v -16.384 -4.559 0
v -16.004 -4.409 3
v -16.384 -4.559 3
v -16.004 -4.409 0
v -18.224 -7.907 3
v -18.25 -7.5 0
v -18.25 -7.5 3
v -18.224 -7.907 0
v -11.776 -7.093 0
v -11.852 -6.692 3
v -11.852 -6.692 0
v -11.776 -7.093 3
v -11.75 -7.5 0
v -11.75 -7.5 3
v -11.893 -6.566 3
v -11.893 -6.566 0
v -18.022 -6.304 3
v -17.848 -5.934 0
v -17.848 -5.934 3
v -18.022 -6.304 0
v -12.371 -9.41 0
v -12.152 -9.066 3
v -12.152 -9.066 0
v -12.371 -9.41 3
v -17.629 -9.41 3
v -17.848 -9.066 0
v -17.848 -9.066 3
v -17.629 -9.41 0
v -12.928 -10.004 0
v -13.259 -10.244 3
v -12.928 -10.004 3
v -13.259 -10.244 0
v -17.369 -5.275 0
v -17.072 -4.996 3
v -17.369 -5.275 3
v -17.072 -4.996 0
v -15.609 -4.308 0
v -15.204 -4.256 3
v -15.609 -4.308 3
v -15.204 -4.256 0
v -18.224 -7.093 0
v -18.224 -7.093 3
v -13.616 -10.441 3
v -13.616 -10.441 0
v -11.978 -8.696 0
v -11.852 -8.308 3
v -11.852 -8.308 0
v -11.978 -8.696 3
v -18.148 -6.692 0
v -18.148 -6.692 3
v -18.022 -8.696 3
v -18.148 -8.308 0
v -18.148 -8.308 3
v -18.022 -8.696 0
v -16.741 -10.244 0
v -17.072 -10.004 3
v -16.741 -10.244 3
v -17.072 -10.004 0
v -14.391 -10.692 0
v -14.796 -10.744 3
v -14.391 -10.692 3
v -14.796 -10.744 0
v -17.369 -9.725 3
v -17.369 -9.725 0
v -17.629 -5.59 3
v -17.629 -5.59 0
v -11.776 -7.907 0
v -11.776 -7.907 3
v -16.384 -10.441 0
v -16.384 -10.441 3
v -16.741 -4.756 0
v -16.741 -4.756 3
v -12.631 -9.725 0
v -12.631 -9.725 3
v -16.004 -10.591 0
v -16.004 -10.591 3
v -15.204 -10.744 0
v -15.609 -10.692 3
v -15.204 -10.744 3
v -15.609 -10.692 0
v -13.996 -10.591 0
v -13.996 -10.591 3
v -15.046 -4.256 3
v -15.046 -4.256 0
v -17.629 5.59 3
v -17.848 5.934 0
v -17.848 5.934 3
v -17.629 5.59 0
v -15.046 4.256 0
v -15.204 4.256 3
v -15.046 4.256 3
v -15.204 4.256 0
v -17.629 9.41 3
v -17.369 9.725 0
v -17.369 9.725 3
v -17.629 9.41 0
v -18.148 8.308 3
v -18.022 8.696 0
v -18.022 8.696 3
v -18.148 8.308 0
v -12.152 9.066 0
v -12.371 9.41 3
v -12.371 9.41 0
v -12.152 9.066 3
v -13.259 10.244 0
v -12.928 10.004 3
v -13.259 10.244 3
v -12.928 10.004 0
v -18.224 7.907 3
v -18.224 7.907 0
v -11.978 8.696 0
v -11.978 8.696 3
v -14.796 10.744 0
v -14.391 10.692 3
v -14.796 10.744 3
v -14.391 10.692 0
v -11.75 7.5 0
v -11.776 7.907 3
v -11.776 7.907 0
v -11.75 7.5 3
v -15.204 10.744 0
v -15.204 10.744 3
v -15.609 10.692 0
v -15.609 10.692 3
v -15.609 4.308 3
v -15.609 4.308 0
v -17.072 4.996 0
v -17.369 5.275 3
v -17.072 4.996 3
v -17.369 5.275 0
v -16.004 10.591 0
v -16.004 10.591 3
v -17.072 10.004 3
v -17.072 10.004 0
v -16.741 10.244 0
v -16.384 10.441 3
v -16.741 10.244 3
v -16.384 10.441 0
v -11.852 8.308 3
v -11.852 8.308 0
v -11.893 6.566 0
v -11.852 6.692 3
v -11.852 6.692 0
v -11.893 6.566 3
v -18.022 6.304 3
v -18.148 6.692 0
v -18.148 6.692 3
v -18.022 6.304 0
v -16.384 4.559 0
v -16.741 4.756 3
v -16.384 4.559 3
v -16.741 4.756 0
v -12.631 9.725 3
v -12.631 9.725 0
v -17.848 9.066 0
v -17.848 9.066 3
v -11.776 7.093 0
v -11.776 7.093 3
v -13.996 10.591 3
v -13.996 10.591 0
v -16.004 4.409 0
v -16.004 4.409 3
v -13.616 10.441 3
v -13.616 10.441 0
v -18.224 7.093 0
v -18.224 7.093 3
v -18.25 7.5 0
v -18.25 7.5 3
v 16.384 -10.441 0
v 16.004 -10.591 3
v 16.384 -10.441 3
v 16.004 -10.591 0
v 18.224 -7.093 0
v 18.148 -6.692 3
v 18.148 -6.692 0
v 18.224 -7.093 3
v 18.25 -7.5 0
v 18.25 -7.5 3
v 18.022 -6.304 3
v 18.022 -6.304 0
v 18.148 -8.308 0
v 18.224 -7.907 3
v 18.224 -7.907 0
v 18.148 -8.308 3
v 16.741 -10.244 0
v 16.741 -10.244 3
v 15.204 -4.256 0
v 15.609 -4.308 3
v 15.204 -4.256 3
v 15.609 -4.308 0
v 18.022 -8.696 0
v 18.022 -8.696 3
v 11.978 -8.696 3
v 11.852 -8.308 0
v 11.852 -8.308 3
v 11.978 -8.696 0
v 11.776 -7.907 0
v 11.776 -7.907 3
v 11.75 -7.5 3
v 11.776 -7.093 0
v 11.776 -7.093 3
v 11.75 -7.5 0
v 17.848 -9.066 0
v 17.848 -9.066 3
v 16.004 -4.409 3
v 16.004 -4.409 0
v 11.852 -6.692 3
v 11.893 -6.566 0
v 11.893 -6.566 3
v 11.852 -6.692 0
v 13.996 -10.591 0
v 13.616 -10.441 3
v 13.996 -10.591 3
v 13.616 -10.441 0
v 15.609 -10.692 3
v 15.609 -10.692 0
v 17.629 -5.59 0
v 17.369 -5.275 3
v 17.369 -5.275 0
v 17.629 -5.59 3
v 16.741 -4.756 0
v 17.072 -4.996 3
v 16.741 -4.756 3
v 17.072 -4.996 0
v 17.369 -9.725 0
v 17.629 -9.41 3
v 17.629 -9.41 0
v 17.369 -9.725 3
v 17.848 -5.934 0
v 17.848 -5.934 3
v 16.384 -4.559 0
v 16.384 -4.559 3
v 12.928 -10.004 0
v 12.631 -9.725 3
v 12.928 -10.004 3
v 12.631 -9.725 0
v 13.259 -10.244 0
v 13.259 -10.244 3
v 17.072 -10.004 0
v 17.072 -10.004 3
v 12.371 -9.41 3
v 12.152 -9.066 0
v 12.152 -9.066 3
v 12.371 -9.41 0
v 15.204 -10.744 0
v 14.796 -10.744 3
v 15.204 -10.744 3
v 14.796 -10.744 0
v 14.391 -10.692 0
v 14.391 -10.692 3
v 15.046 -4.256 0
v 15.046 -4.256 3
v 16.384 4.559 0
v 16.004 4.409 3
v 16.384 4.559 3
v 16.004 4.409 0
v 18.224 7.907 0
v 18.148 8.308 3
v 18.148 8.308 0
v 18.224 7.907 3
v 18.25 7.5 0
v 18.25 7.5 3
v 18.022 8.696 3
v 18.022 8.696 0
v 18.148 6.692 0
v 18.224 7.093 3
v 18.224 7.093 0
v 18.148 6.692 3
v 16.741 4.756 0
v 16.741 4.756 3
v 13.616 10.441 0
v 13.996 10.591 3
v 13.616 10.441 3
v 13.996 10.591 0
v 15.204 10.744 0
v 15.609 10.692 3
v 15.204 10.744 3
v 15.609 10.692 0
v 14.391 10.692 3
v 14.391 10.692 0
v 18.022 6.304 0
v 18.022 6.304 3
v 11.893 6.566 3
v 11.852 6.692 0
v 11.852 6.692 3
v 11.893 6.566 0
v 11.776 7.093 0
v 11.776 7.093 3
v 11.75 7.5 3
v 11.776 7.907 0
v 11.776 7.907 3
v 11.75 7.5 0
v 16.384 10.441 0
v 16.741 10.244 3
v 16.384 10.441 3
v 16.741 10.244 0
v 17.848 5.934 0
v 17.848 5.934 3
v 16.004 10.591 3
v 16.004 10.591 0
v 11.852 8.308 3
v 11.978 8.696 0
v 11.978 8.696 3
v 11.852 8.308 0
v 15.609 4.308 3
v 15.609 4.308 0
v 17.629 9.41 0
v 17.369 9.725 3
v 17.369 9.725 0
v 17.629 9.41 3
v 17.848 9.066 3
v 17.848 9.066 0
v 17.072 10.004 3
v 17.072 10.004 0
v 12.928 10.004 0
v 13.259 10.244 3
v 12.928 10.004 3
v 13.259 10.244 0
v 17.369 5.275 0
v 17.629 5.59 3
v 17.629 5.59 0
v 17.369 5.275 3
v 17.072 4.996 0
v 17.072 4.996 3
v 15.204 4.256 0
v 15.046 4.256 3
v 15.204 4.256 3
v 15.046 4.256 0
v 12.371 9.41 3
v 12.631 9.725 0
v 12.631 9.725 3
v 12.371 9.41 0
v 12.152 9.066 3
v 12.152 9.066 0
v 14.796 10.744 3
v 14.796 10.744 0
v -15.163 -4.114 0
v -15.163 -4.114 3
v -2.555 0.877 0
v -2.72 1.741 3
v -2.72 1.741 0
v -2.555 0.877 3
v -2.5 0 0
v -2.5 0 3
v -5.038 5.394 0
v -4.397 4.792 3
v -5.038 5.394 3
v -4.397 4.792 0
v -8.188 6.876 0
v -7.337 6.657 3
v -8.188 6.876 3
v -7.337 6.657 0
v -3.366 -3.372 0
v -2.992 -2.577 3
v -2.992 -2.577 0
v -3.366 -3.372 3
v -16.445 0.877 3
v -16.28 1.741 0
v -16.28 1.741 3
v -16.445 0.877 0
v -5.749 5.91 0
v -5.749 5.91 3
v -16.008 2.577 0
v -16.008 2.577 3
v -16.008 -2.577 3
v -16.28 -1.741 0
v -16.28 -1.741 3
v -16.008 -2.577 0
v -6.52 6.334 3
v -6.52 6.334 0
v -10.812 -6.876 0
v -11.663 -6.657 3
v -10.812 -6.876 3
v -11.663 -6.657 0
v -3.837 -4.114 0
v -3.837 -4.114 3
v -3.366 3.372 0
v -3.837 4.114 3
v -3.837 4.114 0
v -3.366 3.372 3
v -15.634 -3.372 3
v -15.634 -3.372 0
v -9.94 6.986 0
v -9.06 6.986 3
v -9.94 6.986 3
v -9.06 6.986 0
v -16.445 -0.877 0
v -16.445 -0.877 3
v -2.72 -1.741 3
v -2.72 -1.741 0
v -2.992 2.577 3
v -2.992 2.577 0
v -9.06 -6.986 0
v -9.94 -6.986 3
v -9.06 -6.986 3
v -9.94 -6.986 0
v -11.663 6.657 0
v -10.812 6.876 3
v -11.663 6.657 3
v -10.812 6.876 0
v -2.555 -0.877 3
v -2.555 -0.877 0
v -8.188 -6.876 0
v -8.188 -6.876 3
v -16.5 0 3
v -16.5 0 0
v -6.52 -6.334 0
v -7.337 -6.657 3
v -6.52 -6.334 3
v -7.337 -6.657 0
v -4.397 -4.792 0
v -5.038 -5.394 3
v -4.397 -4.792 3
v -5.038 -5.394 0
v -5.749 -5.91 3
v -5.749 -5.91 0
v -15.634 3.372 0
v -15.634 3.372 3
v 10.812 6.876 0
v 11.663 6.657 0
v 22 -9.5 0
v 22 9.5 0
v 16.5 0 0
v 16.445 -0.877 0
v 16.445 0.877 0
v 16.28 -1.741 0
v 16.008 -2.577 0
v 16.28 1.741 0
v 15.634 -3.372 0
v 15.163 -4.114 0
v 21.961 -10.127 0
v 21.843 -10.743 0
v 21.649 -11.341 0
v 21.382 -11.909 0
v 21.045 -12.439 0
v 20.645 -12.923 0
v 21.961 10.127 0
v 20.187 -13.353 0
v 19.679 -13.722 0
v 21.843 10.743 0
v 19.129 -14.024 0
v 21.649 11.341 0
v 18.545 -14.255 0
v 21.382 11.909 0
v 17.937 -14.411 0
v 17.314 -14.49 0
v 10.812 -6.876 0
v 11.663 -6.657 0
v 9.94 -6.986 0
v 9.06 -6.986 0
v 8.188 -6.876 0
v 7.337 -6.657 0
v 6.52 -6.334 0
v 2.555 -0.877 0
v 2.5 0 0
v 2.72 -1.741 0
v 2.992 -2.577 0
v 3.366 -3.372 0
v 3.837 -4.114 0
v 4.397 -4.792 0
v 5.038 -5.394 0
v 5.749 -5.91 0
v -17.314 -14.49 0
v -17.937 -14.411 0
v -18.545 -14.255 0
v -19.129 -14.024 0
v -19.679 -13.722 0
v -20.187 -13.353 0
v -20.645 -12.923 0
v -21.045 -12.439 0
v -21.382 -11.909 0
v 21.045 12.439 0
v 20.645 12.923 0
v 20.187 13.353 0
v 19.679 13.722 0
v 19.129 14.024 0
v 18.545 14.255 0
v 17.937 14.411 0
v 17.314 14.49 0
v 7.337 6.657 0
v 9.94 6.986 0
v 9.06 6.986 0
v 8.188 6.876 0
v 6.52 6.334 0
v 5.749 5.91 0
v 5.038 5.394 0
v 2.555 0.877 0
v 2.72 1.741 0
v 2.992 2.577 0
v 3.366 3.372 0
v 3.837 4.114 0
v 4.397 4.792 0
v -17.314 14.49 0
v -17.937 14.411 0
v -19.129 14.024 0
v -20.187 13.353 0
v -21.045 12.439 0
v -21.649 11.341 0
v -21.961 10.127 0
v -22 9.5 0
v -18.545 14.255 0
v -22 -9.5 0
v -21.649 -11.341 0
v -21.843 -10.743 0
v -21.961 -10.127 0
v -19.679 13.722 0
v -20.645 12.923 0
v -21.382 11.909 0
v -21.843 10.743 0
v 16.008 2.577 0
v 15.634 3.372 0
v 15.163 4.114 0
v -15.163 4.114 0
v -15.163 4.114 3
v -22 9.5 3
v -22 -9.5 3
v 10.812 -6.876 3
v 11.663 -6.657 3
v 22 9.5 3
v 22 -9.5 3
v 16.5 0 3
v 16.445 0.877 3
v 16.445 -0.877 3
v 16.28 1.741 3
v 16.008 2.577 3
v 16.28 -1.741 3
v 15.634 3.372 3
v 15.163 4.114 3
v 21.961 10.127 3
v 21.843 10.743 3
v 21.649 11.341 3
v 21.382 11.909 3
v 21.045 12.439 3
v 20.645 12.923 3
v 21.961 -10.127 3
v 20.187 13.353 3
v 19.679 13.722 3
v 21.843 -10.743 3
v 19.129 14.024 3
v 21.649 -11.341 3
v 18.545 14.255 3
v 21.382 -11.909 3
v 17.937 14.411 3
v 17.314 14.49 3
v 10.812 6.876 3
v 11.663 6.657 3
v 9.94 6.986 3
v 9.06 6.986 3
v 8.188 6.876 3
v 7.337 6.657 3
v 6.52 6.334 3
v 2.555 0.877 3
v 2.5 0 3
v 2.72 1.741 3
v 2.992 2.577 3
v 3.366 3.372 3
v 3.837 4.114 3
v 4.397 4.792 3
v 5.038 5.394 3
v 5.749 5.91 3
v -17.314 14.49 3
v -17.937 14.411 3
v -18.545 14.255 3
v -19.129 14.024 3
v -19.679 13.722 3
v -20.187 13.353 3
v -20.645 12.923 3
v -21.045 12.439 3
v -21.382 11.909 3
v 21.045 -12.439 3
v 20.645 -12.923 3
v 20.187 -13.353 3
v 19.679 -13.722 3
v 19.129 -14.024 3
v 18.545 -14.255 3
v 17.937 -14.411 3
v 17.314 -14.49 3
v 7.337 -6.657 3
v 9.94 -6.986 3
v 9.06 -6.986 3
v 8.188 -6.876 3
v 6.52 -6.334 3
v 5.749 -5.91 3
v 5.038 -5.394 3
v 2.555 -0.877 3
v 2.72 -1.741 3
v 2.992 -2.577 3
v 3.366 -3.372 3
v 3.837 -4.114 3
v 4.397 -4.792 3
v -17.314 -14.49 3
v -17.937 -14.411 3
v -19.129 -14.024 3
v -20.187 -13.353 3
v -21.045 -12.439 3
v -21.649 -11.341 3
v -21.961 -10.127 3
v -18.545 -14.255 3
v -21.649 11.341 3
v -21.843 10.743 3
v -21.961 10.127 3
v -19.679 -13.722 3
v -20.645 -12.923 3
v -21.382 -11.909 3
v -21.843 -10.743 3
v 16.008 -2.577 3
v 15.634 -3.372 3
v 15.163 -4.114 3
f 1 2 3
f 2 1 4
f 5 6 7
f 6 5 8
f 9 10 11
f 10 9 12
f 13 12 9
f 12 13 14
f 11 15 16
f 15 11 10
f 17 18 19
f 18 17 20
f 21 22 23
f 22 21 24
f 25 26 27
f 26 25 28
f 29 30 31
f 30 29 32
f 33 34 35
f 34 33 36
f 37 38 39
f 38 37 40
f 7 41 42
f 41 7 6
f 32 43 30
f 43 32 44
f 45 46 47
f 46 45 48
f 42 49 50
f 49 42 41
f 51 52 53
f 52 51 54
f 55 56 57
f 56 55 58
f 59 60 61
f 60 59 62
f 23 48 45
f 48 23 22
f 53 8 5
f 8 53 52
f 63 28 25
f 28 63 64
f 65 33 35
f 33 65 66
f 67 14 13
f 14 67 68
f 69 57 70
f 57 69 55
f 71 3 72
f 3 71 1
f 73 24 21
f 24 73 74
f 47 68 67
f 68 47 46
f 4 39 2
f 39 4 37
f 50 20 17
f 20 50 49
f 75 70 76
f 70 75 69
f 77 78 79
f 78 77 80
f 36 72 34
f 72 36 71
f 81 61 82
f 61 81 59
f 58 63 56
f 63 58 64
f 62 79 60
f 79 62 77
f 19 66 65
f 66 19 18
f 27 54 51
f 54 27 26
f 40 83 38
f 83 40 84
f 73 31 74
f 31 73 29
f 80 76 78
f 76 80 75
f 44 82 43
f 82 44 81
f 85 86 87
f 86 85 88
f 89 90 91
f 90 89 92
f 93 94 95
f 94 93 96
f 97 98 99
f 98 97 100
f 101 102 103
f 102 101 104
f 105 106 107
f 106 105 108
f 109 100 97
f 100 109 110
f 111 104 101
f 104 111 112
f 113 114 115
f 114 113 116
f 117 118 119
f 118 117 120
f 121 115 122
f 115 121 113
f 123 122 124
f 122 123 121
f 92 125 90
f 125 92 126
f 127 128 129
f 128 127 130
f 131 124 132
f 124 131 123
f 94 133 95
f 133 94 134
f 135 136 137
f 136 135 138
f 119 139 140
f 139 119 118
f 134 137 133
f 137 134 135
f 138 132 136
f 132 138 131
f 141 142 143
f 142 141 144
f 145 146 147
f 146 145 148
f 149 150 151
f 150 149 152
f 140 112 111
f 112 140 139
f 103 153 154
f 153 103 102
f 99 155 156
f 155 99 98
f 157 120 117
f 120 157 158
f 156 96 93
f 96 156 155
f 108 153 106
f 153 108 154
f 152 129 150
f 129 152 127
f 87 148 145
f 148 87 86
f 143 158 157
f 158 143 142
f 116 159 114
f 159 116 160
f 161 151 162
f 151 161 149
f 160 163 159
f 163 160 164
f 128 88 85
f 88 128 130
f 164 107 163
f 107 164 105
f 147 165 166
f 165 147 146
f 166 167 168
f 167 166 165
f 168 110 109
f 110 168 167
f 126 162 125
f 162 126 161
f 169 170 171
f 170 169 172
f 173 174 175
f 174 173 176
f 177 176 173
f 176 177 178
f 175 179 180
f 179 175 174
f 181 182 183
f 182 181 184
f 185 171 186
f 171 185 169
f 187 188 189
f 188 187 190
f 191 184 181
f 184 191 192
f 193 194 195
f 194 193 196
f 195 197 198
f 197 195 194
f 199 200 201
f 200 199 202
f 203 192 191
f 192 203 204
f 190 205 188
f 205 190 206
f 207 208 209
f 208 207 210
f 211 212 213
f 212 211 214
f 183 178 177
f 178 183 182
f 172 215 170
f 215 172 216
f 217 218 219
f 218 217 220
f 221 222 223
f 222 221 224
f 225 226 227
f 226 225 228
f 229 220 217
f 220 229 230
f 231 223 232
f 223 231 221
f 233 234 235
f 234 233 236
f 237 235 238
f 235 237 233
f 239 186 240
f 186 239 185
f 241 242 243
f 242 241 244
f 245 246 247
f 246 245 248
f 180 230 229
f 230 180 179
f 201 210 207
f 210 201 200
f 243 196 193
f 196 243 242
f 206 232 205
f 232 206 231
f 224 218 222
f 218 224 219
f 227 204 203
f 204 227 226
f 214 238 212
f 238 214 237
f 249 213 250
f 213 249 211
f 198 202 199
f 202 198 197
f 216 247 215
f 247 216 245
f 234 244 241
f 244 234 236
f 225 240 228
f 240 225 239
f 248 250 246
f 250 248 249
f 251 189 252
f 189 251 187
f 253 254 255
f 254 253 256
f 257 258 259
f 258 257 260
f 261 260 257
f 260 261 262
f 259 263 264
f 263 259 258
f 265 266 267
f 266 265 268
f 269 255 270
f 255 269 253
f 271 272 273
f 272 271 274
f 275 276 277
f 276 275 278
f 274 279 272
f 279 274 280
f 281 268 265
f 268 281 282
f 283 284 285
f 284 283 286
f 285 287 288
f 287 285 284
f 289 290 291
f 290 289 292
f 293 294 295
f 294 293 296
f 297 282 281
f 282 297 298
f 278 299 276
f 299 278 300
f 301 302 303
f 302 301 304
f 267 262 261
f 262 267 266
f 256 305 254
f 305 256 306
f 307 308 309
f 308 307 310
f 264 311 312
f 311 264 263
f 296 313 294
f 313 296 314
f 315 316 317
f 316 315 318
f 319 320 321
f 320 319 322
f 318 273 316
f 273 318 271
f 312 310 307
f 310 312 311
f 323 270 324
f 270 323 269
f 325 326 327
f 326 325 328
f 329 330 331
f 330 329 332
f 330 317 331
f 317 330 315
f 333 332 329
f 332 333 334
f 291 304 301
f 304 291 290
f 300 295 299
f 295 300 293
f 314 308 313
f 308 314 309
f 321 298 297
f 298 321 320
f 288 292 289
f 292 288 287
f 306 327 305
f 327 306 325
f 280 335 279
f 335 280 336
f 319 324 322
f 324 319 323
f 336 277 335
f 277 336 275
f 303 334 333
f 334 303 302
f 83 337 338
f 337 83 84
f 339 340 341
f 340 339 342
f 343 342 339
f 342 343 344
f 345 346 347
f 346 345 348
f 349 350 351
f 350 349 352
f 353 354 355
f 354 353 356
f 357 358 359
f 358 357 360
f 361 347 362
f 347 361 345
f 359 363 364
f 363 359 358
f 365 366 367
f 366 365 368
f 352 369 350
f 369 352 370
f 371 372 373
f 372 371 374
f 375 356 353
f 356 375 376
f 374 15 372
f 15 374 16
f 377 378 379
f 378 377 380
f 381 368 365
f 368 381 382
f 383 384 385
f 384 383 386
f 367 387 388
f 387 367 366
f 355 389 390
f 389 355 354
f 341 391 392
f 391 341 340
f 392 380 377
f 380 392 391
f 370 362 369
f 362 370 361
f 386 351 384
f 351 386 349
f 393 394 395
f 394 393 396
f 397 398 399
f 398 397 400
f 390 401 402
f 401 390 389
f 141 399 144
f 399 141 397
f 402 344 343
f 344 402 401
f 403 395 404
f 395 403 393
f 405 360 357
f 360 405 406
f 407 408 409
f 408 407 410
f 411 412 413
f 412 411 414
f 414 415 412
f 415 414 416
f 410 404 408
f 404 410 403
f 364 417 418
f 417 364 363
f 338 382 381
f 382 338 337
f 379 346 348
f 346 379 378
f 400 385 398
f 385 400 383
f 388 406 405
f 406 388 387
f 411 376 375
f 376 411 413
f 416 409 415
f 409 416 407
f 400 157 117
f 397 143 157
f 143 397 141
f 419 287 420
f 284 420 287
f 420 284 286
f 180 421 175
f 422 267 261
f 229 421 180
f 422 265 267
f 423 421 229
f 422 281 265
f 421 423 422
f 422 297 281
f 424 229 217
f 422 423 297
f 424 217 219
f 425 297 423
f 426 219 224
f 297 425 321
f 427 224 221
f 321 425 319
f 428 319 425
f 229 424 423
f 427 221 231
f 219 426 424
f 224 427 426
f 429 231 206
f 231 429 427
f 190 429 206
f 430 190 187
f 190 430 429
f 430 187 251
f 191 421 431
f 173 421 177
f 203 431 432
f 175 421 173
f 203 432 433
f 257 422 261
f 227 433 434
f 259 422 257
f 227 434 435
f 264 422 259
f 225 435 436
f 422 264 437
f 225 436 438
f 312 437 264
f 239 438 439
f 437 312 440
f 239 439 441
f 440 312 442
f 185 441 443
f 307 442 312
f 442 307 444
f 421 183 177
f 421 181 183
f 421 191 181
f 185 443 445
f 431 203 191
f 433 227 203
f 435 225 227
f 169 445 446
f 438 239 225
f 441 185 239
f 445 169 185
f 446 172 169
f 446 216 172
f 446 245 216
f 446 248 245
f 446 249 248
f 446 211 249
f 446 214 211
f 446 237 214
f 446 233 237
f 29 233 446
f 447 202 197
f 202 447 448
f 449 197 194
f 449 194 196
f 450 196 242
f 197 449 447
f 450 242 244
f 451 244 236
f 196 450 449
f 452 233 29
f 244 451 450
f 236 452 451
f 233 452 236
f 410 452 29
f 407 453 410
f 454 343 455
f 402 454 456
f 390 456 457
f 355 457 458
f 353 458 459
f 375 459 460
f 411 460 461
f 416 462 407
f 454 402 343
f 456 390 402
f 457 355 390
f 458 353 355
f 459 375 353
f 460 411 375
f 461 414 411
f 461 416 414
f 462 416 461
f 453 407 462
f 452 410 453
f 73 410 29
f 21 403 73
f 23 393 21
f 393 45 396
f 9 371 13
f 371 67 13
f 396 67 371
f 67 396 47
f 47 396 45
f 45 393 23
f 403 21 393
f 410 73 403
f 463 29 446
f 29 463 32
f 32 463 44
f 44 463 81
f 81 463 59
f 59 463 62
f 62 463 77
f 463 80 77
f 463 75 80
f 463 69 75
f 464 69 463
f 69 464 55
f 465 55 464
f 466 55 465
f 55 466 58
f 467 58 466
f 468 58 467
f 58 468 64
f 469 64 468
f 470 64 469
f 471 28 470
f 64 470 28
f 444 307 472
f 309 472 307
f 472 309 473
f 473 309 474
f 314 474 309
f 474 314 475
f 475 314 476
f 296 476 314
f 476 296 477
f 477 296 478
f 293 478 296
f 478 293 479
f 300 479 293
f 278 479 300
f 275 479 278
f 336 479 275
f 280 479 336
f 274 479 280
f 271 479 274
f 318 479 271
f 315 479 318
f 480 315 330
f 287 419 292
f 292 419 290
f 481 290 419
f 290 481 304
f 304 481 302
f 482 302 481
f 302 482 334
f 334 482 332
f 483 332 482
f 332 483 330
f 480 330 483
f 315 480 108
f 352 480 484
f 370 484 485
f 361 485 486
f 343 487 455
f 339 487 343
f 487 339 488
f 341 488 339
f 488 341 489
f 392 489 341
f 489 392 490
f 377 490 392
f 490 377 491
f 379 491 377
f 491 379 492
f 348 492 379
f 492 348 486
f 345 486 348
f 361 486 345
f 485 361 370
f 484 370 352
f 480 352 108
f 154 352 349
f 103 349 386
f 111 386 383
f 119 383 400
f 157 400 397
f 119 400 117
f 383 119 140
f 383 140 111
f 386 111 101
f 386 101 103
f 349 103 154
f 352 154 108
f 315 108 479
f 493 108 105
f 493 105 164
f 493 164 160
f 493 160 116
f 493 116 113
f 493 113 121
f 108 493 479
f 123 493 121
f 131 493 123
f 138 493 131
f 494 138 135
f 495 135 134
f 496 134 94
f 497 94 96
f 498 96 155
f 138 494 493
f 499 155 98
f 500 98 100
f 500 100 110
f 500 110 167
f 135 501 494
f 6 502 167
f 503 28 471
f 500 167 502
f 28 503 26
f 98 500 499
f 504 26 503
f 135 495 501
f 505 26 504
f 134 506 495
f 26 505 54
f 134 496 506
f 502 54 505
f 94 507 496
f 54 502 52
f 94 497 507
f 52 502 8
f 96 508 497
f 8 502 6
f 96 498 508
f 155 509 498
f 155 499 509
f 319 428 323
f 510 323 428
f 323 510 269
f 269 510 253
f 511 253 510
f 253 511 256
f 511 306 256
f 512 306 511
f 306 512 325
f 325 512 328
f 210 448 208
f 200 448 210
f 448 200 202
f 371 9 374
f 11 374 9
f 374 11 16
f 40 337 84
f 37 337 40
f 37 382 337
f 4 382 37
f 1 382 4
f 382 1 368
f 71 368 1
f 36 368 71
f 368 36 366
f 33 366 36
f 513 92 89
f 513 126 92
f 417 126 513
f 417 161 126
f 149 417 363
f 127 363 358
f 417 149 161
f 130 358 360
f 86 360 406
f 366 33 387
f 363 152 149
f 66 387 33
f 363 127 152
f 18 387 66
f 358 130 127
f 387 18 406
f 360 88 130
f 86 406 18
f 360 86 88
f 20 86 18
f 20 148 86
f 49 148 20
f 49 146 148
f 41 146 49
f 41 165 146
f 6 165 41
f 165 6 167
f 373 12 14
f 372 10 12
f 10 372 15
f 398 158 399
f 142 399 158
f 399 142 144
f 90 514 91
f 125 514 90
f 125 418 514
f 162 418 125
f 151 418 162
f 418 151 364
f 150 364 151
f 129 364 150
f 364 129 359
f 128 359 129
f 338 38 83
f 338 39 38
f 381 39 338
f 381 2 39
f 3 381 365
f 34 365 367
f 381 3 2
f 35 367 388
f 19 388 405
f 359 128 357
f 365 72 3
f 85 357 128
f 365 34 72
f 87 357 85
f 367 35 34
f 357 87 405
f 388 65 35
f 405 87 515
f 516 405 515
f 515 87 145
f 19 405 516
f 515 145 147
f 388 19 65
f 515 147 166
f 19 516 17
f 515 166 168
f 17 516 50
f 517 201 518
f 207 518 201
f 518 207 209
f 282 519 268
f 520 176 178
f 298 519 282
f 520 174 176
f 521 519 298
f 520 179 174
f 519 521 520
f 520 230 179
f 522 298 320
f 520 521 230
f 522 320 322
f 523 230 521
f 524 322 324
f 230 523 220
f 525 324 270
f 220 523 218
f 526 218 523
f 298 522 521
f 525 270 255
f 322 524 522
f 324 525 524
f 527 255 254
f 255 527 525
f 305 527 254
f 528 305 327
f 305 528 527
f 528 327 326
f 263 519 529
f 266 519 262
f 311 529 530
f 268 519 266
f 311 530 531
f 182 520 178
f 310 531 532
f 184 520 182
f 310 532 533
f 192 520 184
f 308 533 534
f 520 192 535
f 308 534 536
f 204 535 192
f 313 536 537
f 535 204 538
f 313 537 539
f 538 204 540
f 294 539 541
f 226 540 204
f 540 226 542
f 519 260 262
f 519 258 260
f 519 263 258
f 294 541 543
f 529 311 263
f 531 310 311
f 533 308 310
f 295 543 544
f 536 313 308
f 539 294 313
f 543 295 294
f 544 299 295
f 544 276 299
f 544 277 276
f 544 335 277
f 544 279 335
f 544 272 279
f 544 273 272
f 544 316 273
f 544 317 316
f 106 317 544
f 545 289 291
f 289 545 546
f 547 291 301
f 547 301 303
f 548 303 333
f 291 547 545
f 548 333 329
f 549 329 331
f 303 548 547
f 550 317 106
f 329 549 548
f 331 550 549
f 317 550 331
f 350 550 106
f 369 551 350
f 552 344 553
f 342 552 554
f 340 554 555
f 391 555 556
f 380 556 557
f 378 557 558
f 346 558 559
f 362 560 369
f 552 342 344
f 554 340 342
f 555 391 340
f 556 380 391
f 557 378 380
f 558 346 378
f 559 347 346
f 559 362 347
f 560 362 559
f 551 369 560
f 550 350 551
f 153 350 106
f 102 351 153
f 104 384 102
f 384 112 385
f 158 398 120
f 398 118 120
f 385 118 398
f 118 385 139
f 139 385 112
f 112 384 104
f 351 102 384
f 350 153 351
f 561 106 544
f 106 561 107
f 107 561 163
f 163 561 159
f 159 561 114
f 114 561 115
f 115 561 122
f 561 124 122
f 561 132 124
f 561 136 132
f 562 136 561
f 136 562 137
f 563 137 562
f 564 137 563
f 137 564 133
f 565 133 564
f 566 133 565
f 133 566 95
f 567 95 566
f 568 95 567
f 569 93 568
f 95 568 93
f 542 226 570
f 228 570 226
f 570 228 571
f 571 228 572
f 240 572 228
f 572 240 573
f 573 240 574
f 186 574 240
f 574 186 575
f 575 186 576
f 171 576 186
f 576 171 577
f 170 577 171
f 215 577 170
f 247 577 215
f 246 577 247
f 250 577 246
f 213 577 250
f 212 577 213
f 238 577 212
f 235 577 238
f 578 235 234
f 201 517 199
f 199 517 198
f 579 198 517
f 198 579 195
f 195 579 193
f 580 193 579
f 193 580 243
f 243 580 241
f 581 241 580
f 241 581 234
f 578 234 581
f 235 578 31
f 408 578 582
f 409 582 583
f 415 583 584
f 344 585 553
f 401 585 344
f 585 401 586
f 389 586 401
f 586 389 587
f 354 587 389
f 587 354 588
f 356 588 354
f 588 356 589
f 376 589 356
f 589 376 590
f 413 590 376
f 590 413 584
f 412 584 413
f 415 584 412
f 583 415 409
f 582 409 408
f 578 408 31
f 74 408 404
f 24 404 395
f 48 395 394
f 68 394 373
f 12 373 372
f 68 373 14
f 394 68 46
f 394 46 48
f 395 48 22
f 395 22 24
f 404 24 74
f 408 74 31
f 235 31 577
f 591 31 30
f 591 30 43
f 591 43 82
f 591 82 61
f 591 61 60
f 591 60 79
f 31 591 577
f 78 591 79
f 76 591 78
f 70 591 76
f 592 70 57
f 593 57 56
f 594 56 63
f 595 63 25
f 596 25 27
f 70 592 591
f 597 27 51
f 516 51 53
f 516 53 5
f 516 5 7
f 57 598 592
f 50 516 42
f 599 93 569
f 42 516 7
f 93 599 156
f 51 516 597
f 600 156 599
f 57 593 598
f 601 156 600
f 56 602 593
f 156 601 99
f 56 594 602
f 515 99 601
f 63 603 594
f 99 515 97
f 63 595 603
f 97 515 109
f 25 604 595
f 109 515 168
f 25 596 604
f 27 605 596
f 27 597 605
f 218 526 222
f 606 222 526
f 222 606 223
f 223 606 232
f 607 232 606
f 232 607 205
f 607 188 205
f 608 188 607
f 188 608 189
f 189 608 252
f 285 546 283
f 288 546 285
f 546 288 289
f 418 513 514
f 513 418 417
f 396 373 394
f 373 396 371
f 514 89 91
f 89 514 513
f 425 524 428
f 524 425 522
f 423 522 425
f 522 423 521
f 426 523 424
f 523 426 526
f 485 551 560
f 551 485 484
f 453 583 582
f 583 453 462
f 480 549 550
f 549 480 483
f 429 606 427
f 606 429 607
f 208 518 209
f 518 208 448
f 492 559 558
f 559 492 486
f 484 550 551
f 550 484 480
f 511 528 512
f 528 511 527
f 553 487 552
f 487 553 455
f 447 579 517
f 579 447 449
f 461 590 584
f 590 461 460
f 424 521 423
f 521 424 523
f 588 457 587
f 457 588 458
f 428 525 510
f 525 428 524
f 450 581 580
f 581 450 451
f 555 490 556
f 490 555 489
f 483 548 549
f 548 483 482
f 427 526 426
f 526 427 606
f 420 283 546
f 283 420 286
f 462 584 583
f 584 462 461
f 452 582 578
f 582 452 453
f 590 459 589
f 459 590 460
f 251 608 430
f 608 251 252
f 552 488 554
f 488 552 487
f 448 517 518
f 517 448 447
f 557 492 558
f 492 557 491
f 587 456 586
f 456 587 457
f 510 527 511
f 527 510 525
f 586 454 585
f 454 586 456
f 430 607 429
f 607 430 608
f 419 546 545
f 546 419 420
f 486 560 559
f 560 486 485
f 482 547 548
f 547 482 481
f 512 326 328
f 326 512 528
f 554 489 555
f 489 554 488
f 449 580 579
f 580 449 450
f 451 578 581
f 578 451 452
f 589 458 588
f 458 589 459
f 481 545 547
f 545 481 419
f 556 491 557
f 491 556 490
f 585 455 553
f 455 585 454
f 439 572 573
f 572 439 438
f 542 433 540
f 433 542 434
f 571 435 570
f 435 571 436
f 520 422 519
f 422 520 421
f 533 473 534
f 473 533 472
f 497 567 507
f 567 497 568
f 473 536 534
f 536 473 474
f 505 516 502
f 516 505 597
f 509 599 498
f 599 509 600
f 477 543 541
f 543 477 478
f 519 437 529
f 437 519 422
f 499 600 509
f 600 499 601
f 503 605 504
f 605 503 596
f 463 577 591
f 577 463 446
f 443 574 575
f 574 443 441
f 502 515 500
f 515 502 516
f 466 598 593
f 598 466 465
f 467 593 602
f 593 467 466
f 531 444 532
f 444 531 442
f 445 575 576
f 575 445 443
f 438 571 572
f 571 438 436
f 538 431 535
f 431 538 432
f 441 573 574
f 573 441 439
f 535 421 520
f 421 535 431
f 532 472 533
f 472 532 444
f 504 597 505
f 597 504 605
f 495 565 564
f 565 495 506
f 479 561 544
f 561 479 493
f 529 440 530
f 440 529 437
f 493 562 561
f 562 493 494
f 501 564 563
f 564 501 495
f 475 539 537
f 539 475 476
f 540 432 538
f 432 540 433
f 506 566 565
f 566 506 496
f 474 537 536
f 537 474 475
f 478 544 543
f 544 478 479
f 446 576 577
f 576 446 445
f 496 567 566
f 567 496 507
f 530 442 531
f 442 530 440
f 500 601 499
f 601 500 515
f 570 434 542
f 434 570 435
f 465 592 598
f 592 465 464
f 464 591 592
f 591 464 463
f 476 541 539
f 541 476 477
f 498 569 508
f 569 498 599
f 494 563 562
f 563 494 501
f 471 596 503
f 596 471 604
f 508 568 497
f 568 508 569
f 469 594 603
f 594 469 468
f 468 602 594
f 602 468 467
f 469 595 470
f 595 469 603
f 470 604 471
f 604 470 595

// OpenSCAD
$fn = 50;


difference() {
	union() {
		hull() {
			translate(v = [-17.0000000000, 9.5000000000, 0]) {
				cylinder(h = 3, r = 5);
			}
			translate(v = [17.0000000000, 9.5000000000, 0]) {
				cylinder(h = 3, r = 5);
			}
			translate(v = [-17.0000000000, -9.5000000000, 0]) {
				cylinder(h = 3, r = 5);
			}
			translate(v = [17.0000000000, -9.5000000000, 0]) {
				cylinder(h = 3, r = 5);
			}
		}
	}
	union() {
		#translate(v = [-15.0000000000, -7.5000000000, -100.0000000000]) {
			cylinder(h = 200, r = 3.2500000000);
		}
		#translate(v = [-15.0000000000, 7.5000000000, -100.0000000000]) {
			cylinder(h = 200, r = 3.2500000000);
		}
		#translate(v = [15.0000000000, -7.5000000000, -100.0000000000]) {
			cylinder(h = 200, r = 3.2500000000);
		}
		#translate(v = [15.0000000000, 7.5000000000, -100.0000000000]) {
			cylinder(h = 200, r = 3.2500000000);
		}
		#translate(v = [-9.5000000000, 0, 0]) {
			cylinder(h = 3, r = 7.0000000000);
		}
		#translate(v = [9.5000000000, 0, 0]) {
			cylinder(h = 3, r = 7.0000000000);
		}
	}
}
